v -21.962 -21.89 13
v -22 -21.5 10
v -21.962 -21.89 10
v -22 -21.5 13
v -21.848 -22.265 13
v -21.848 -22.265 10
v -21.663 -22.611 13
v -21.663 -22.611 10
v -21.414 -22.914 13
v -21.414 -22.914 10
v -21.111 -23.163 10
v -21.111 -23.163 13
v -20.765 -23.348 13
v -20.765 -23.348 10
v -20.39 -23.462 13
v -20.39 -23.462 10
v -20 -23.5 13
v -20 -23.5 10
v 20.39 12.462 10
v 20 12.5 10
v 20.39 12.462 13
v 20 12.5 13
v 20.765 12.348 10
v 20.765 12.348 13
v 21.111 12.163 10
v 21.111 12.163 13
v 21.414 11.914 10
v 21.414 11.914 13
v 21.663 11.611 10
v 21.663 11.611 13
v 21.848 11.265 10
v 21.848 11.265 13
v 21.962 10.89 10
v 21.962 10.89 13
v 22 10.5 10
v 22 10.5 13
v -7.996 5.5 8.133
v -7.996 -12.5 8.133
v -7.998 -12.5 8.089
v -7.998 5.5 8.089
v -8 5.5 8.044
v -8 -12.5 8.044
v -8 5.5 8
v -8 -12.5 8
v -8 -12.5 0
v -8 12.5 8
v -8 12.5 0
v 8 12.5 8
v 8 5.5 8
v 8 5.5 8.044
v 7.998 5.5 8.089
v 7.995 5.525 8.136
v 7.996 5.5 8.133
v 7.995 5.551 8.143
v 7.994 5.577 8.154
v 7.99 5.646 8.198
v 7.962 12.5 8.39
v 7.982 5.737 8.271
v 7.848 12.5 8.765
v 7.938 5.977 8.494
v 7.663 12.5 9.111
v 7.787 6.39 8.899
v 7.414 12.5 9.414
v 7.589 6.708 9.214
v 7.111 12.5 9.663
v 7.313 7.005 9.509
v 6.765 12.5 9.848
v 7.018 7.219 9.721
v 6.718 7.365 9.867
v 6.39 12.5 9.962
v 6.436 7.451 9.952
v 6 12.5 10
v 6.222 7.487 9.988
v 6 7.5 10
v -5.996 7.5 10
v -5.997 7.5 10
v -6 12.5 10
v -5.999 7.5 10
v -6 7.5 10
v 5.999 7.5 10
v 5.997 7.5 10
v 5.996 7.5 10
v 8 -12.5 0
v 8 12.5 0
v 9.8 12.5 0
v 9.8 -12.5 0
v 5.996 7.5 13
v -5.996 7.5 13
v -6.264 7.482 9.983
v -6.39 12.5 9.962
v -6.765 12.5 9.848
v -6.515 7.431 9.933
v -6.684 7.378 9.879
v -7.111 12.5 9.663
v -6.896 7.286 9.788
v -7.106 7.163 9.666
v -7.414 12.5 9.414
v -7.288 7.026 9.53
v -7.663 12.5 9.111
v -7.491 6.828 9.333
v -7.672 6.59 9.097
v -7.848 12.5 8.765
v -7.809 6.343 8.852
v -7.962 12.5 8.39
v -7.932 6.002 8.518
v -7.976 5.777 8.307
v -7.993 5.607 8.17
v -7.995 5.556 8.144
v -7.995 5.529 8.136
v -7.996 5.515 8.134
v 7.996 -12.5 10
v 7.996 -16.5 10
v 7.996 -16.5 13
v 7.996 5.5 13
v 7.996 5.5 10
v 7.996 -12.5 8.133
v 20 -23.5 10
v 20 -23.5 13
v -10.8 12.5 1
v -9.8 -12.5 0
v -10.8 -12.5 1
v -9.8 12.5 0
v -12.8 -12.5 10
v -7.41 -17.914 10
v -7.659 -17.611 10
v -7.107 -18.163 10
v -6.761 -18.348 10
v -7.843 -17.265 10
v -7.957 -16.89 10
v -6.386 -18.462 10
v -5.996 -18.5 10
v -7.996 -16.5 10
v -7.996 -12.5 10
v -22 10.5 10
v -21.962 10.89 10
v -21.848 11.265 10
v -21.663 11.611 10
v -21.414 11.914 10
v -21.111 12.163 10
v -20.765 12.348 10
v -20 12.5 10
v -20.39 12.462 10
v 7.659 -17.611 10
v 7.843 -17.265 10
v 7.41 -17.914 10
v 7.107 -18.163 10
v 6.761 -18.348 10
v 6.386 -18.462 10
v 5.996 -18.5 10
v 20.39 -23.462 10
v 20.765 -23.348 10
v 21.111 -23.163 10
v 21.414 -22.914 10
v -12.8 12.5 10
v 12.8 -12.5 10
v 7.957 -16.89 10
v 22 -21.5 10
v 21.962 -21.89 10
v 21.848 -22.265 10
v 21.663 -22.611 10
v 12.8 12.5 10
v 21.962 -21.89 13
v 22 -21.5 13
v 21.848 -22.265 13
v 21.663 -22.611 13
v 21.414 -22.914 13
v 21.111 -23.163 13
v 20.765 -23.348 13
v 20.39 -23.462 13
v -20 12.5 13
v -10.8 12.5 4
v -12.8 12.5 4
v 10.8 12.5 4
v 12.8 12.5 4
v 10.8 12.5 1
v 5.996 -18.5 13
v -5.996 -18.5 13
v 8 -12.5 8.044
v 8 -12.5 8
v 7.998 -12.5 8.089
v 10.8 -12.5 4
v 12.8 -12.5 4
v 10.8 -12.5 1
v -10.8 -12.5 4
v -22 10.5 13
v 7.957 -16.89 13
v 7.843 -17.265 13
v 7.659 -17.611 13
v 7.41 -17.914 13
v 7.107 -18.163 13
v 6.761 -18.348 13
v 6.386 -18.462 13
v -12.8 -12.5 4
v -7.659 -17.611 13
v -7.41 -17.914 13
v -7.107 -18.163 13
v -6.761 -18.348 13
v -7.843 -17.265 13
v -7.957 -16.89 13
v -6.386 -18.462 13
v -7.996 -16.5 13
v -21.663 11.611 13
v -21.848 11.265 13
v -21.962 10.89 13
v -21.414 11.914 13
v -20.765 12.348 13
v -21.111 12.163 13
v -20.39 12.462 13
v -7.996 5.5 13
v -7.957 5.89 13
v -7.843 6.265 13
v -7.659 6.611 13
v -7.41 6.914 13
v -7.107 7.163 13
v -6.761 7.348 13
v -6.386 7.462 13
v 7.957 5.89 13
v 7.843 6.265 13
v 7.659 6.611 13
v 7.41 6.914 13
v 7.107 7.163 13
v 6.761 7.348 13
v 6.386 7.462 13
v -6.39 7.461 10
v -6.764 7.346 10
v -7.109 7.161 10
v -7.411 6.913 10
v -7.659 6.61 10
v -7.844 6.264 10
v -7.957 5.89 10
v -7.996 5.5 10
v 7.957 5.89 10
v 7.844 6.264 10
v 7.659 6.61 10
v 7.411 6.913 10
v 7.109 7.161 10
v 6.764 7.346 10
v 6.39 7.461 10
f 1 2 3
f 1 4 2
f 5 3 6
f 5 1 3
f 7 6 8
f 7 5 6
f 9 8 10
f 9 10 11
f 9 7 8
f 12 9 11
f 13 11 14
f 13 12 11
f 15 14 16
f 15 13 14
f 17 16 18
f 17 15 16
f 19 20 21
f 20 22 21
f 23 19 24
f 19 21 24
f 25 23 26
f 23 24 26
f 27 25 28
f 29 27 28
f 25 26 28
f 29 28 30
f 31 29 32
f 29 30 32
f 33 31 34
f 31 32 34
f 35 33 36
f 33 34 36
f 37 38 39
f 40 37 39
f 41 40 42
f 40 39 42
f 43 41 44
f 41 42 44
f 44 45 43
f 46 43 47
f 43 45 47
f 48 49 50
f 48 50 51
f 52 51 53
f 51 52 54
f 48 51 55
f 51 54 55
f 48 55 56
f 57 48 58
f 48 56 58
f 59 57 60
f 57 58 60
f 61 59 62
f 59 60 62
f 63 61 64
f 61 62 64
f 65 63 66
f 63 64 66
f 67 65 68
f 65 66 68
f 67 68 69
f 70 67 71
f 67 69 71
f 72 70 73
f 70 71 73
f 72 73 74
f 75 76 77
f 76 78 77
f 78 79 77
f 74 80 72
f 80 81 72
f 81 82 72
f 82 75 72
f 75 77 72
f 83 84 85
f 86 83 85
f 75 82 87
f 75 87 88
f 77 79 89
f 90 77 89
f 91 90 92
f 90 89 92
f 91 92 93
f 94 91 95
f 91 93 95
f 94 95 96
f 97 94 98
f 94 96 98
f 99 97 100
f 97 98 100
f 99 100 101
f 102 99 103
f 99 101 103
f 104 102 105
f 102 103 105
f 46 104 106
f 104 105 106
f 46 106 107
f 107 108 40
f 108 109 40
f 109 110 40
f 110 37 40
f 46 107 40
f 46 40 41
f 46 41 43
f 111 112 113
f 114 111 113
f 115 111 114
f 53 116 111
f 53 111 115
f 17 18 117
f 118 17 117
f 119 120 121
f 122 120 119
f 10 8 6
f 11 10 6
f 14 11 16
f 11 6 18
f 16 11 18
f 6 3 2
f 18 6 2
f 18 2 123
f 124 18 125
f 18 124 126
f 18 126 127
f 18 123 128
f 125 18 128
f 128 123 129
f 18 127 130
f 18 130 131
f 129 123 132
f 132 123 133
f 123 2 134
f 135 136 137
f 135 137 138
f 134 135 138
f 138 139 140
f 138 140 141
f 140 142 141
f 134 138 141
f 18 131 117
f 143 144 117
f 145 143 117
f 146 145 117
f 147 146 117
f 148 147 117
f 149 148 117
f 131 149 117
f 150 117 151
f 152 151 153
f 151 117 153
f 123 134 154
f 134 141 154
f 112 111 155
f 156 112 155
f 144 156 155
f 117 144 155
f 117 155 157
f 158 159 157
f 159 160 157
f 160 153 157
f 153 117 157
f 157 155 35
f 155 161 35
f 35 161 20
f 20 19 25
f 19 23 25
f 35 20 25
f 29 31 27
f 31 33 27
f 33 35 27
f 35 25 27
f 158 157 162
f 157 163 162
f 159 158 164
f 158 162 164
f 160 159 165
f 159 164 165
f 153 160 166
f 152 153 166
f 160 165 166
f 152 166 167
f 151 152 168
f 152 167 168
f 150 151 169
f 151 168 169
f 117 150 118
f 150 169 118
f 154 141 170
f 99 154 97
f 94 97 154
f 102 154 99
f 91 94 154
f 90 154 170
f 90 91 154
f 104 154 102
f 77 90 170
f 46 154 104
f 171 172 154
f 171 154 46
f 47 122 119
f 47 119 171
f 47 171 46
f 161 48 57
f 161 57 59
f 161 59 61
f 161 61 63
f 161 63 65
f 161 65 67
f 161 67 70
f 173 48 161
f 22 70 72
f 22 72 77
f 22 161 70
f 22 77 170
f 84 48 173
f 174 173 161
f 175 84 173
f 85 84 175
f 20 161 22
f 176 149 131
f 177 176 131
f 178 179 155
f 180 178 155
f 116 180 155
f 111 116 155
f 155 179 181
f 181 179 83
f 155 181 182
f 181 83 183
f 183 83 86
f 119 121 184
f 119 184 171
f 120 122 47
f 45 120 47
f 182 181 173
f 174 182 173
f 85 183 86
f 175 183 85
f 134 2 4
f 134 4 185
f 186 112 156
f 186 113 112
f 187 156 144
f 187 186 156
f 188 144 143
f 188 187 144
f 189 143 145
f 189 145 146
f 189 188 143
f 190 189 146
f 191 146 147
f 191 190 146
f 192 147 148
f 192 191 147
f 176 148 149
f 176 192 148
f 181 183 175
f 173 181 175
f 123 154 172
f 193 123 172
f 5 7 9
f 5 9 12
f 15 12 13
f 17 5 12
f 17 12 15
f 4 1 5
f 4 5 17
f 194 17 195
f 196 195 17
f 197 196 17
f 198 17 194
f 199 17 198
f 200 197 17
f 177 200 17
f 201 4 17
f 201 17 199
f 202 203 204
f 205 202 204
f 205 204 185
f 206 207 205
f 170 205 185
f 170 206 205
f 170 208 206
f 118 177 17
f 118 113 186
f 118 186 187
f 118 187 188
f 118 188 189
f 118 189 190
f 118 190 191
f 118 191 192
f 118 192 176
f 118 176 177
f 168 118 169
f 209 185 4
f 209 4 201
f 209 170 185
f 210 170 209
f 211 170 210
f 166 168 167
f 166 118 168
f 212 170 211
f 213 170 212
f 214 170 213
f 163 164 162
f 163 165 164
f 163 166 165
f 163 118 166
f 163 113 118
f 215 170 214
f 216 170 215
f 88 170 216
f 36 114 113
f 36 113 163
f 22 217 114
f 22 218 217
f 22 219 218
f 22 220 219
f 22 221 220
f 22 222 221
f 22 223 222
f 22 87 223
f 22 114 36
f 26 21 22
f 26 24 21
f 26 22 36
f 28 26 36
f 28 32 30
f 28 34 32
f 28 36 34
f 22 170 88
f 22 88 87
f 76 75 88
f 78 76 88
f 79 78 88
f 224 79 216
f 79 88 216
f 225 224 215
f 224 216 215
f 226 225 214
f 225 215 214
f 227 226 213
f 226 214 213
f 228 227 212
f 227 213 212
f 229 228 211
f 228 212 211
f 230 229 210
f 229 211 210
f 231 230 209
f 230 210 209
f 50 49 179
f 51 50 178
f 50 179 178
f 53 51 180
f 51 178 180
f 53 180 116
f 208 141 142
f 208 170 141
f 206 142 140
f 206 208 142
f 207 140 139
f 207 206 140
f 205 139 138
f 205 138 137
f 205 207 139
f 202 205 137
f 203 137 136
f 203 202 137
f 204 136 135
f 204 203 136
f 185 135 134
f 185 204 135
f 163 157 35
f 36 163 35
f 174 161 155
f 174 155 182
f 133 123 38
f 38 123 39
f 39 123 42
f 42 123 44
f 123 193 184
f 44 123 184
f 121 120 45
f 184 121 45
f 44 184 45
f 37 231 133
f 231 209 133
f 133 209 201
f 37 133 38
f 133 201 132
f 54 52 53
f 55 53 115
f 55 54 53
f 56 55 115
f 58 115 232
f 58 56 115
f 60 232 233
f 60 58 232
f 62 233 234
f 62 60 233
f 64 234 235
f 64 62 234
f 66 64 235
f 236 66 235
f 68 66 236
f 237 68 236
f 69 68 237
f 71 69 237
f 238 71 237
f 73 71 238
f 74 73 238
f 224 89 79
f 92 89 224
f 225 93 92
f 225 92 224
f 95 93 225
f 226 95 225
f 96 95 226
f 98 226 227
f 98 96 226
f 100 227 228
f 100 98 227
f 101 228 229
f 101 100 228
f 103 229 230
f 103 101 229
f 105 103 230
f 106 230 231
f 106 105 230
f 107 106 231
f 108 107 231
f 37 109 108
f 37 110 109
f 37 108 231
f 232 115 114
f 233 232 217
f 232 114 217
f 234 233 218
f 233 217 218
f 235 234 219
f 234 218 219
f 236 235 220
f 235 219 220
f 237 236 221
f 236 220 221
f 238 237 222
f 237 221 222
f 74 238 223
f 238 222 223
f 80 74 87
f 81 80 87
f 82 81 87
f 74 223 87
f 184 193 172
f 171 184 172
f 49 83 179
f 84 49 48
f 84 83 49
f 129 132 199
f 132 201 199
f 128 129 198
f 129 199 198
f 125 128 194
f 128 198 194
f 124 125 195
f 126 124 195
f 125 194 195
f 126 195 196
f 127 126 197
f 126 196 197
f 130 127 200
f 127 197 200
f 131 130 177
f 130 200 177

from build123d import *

# Parameters (mm, degrees)
SKETCH_1_W           = 21.6
SKETCH_1_H           = 25
EXTRUDE_1_DEPTH      = 10
SKETCH_2_W           = 44
SKETCH_2_H           = 36
EXTRUDE_2_DEPTH      = 3
EXTRUDE_3_DEPTH      = 2
EXTRUDE_3_DEPTH_BACK = 23.6
SKETCH_3_W           = 6
SKETCH_3_H           = 25
CHAMFER_1_SIZE       = 1
SKETCH_4_W           = 16
SKETCH_4_H           = 25
CUT_EXTRUDE_1_DEPTH  = 10
FILLET_1_R           = 2
SKETCH_5_W           = 15.991126726
SKETCH_5_H           = 26
CUT_EXTRUDE_2_DEPTH  = 34.708307581
FILLET_2_R           = 2
FILLET_START         = 5.4999999
FILLET_3_DEPTH       = 7.0000001
FILLET_START_2       = -12.5
FILLET_3_2_DEPTH     = 18.304364073
FILLET_START_3       = 8
FILLET_3_3_DEPTH     = 2


with BuildPart() as part:
    # ｽｹｯﾁ1 → ﾎﾞｽ - 押し出し1 (new body)
    with BuildSketch(Plane.XY):
        Rectangle(SKETCH_1_W, SKETCH_1_H)
    extrude(amount=EXTRUDE_1_DEPTH)

    # ｽｹｯﾁ2 → ﾎﾞｽ - 押し出し2 (add)
    with BuildSketch(Plane.XY.offset(10)):
        with Locations((0, -5.5)):
            Rectangle(SKETCH_2_W, SKETCH_2_H)
    extrude(amount=EXTRUDE_2_DEPTH)

    # ｽｹｯﾁ3 → ﾎﾞｽ - 押し出し3 (add, two sides: drawn at the far end of the back side and taken through both)
    with BuildSketch(Plane(origin=(10.8, 0, 0), x_dir=(0, 0, -1), z_dir=(1, 0, 0)).offset(-EXTRUDE_3_DEPTH_BACK)):
        with Locations((-7, 0)):
            Rectangle(SKETCH_3_W, SKETCH_3_H)
    extrude(amount=EXTRUDE_3_DEPTH + EXTRUDE_3_DEPTH_BACK)

    # 面取り1
    chamfer_1_edges = [part.edges().sort_by_distance(p)[0] for p in [
        (-10.8, 0, 0),
        (10.8, 0, 0),
    ]]
    chamfer(chamfer_1_edges, length=CHAMFER_1_SIZE)

    # ｽｹｯﾁ4 → ｶｯﾄ - 押し出し1 (cut)
    with BuildSketch(Plane(origin=(0, 0, 0), x_dir=(-1, 0, 0), z_dir=(0, 0, -1))):
        Rectangle(SKETCH_4_W, SKETCH_4_H)
    extrude(amount=-CUT_EXTRUDE_1_DEPTH, mode=Mode.SUBTRACT)

    # ﾌｨﾚｯﾄ1
    fillet_1_edges = [part.edges().sort_by_distance(p)[0] for p in [
        (22, -23.5, 11.5),
        (22, 12.5, 11.5),
        (-22, 12.5, 11.5),
        (-22, -23.5, 11.5),
    ]]
    fillet(fillet_1_edges, radius=FILLET_1_R)

    # ｽｹｯﾁ5 → ｶｯﾄ - 押し出し2 (cut, through all)
    with BuildSketch(Plane(origin=(0, 0, 10), x_dir=(-1, 0, 0), z_dir=(0, 0, -1))):
        with Locations((0, -5.5)):
            Rectangle(SKETCH_5_W, SKETCH_5_H)
    extrude(amount=-CUT_EXTRUDE_2_DEPTH, mode=Mode.SUBTRACT)

    # ﾌｨﾚｯﾄ2
    fillet_2_edges = [part.edges().sort_by_distance(p)[0] for p in [
        (-7.995563363, 7.5, 11.5),
        (-7.995563363, -18.5, 11.5),
        (7.995563363, -18.5, 11.5),
        (7.995563363, 7.5, 11.5),
    ]]
    fillet(fillet_2_edges, radius=FILLET_2_R)

    # ﾌｨﾚｯﾄ3: read off the stored shape, not the designer's step
    # ﾌｨﾚｯﾄ3 outline → ﾌｨﾚｯﾄ3 (add)
    with BuildSketch(Plane(origin=(0, 0, 0), x_dir=(1, 0, 0), z_dir=(0, 1, 0)).offset(FILLET_START)):
        with BuildLine():
            ThreePointArc((-6, -10), (-7.414213562, -9.414213562), (-8, -8))
            Line((-8, -8), (-8, -10))
            Line((-8, -10), (-6, -10))
        make_face()
        with BuildLine():
            Line((6, -10), (8, -10))
            Line((8, -10), (8, -8))
            ThreePointArc((8, -8), (7.414213562, -9.414213562), (6, -10))
        make_face()
    extrude(amount=FILLET_3_DEPTH)

    # Fillet 3 2 outline → Fillet 3 2 (add)
    with BuildSketch(Plane(origin=(0, 0, 0), x_dir=(1, 0, 0), z_dir=(0, 1, 0)).offset(FILLET_START_2)):
        with BuildLine():
            Line((-7.995563363, -10), (-7.995563363, -8.133142264))
            ThreePointArc((-7.995563363, -8.133142264), (-7.998890533, -8.066608082), (-8, -8))
            Line((-8, -8), (-8, -10))
            Line((-8, -10), (-7.995563363, -10))
        make_face()
        with BuildLine():
            ThreePointArc((8, -8), (7.998890533, -8.066608082), (7.995563363, -8.133142264))
            Line((7.995563363, -8.133142264), (7.995563363, -10))
            Line((7.995563363, -10), (8, -10))
            Line((8, -10), (8, -8))
        make_face()
    extrude(amount=FILLET_3_2_DEPTH)

    # Fillet 3 3 outline → Fillet 3 3 (cut)
    with BuildSketch(Plane.XY.offset(FILLET_START_3)):
        with BuildLine():
            Line((5.995563363, 7.5), (-5.995563363, 7.5))
            ThreePointArc((-5.995563363, 7.5), (-7.409776925, 6.914213563), (-7.995563363, 5.5))
            Line((-7.995563363, 5.5), (7.995563363, 5.5))
            ThreePointArc((7.995563363, 5.5), (7.409776925, 6.914213563), (5.995563363, 7.5))
        make_face()
    extrude(amount=FILLET_3_3_DEPTH, mode=Mode.SUBTRACT)


solid = part.part
